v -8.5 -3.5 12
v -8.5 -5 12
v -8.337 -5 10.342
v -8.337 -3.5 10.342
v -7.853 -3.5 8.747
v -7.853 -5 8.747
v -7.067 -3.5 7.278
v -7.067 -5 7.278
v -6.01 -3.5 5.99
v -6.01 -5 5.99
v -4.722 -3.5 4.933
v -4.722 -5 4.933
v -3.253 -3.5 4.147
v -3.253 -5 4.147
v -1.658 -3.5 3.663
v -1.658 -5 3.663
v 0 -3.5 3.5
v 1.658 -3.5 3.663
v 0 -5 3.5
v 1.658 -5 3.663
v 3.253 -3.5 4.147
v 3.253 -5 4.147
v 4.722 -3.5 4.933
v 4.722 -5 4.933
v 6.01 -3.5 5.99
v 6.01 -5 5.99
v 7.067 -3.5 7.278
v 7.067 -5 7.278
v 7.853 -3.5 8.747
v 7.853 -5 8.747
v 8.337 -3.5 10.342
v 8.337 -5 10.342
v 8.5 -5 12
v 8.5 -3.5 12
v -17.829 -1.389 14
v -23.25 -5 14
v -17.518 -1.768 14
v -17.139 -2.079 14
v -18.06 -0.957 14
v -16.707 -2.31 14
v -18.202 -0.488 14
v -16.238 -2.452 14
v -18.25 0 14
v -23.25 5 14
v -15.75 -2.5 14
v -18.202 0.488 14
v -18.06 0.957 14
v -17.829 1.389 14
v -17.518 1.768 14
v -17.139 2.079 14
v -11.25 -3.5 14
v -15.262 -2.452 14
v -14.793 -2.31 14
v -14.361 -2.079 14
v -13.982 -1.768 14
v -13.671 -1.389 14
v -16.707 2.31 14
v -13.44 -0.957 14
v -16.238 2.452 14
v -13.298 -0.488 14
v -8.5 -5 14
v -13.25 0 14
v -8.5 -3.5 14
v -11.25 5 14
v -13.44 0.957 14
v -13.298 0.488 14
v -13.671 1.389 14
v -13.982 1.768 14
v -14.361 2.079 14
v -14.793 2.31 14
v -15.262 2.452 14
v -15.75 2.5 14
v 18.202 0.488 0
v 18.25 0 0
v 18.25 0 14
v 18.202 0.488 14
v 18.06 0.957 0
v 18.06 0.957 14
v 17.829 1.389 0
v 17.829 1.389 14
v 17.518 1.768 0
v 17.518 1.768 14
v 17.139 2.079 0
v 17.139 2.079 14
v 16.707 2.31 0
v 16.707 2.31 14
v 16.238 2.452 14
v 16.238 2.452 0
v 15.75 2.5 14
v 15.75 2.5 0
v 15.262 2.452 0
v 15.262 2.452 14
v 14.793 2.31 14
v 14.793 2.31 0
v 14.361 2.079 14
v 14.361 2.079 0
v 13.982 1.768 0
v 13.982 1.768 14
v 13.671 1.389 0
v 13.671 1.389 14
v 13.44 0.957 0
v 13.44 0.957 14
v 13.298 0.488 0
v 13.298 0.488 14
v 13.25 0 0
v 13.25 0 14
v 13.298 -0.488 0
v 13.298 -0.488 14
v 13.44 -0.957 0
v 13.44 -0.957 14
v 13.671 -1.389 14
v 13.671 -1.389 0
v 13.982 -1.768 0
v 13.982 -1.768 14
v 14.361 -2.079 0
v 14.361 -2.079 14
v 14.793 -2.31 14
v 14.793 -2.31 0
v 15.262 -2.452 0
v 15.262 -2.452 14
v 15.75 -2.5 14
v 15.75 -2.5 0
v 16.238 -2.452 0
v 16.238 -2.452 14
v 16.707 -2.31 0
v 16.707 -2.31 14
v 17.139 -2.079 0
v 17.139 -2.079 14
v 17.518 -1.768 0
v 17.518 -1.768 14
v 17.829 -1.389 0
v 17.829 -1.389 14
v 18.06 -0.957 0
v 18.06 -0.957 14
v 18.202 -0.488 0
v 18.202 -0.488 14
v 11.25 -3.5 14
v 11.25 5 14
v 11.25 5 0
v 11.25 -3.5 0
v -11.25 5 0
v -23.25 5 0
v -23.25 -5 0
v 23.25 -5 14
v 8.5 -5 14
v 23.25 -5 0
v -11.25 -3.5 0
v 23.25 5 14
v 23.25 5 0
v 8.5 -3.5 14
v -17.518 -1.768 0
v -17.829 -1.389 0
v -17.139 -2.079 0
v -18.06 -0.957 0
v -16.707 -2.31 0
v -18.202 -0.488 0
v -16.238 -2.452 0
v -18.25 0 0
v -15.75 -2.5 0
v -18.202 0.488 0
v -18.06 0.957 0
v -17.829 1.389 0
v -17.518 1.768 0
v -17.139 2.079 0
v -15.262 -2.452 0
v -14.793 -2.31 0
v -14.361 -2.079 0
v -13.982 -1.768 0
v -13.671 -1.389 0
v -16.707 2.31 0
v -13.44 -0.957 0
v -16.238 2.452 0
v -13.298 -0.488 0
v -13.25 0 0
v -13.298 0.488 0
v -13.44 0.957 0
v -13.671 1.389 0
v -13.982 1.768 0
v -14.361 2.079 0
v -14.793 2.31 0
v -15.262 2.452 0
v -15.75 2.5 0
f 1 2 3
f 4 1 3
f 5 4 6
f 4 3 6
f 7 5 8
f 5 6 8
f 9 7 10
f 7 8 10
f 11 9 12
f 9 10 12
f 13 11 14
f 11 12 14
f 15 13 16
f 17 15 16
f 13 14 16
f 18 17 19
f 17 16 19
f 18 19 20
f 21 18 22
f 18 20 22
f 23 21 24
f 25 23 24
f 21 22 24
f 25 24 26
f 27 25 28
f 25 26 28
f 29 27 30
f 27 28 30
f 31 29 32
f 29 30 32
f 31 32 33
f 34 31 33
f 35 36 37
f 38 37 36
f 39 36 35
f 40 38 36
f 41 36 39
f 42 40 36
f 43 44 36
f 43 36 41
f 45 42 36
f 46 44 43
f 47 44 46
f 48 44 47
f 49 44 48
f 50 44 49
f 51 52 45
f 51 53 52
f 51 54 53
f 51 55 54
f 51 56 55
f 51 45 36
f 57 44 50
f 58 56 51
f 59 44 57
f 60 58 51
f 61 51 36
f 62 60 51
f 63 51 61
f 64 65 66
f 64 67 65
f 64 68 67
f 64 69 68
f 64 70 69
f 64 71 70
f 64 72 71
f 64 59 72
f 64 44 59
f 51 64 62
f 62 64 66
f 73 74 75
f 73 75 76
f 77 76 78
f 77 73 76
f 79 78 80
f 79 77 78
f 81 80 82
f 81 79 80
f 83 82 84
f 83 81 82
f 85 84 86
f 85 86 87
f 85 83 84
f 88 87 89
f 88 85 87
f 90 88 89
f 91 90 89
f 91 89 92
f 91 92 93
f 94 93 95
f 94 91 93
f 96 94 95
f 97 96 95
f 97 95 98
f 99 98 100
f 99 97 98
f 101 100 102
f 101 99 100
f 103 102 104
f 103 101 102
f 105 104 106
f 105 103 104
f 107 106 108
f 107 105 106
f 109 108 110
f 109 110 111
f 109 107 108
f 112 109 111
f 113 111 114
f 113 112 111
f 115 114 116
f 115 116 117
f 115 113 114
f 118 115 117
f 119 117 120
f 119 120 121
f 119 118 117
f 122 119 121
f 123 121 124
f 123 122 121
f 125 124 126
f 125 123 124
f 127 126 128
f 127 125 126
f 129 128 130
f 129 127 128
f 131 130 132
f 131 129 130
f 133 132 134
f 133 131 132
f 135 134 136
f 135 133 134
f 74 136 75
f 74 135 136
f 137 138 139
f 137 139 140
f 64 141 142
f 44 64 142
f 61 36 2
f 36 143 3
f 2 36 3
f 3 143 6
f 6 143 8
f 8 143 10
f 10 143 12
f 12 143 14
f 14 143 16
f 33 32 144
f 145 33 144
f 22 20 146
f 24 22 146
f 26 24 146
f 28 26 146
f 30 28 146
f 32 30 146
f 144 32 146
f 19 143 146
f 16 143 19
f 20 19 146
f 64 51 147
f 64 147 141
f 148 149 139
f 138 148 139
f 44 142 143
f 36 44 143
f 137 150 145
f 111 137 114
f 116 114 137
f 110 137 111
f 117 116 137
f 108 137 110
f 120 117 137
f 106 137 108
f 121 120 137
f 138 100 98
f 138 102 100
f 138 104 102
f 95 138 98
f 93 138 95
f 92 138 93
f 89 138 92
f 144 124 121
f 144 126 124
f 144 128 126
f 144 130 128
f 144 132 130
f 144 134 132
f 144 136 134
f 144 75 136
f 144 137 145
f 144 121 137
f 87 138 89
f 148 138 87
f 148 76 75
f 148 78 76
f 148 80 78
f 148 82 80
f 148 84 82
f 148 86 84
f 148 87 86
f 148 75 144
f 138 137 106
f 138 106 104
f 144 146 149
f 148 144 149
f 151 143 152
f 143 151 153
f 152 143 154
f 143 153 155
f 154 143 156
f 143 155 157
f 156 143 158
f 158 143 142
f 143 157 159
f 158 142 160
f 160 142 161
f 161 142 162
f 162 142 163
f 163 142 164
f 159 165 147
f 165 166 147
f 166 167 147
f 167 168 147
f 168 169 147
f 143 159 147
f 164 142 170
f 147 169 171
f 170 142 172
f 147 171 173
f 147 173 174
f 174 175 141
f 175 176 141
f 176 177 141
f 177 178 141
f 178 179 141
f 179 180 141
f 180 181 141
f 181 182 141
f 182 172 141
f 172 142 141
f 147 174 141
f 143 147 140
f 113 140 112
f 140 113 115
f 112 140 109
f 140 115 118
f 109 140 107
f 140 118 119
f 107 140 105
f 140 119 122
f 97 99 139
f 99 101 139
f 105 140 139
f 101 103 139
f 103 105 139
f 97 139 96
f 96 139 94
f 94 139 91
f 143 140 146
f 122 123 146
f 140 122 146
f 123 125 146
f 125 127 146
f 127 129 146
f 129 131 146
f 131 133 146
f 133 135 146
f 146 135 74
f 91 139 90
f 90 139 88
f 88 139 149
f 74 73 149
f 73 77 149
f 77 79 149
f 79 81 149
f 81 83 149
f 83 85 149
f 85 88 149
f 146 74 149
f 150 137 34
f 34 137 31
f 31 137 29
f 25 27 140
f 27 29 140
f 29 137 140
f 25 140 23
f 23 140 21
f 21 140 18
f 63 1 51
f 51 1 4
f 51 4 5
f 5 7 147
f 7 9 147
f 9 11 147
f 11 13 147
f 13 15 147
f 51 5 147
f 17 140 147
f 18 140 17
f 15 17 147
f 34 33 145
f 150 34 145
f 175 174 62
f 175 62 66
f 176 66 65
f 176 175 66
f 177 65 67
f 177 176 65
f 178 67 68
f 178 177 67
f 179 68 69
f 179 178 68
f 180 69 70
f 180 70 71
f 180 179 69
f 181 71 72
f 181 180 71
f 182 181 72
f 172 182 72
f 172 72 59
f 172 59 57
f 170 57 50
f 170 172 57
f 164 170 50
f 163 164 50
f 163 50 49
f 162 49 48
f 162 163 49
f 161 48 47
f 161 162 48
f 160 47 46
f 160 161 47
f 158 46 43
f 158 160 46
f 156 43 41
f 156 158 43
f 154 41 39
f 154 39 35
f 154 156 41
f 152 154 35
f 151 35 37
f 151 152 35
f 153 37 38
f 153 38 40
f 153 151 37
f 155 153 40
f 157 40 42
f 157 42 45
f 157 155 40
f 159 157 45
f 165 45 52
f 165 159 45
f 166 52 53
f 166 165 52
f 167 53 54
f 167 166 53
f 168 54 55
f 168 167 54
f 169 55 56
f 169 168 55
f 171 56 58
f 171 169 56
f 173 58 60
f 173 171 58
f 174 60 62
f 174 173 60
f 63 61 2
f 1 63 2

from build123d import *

# Parameters (mm, degrees)
F0_R     = 2.5
F1_DEPTH = 14
F3_DEPTH = 25


with BuildPart() as f1:
    # F0 (on Top) → F1 (new body)
    with BuildSketch(Plane.XY):
        Polygon((-11.25, 5), (-23.25, 5), (-23.25, -5), (23.25, -5), (23.25, 5), (11.25, 5), (11.25, -3.5), (-11.25, -3.5), align=None)
        with Locations((-15.75, 0)):
            Circle(F0_R, mode=Mode.SUBTRACT)
        with Locations((15.75, 0)):
            Circle(F0_R, mode=Mode.SUBTRACT)
    extrude(amount=F1_DEPTH)

    # F2 (on face) → F3 (cut)
    with BuildSketch(Plane.XZ.offset(5)):
        with BuildLine():
            Line((-8.5, 14), (-8.5, 12))
            ThreePointArc((-8.5, 12), (0, 3.5), (8.5, 12))
            Line((8.5, 12), (8.5, 14))
            Line((8.5, 14), (-8.5, 14))
        make_face()
    extrude(amount=-F3_DEPTH, mode=Mode.SUBTRACT)


solid = f1.part
